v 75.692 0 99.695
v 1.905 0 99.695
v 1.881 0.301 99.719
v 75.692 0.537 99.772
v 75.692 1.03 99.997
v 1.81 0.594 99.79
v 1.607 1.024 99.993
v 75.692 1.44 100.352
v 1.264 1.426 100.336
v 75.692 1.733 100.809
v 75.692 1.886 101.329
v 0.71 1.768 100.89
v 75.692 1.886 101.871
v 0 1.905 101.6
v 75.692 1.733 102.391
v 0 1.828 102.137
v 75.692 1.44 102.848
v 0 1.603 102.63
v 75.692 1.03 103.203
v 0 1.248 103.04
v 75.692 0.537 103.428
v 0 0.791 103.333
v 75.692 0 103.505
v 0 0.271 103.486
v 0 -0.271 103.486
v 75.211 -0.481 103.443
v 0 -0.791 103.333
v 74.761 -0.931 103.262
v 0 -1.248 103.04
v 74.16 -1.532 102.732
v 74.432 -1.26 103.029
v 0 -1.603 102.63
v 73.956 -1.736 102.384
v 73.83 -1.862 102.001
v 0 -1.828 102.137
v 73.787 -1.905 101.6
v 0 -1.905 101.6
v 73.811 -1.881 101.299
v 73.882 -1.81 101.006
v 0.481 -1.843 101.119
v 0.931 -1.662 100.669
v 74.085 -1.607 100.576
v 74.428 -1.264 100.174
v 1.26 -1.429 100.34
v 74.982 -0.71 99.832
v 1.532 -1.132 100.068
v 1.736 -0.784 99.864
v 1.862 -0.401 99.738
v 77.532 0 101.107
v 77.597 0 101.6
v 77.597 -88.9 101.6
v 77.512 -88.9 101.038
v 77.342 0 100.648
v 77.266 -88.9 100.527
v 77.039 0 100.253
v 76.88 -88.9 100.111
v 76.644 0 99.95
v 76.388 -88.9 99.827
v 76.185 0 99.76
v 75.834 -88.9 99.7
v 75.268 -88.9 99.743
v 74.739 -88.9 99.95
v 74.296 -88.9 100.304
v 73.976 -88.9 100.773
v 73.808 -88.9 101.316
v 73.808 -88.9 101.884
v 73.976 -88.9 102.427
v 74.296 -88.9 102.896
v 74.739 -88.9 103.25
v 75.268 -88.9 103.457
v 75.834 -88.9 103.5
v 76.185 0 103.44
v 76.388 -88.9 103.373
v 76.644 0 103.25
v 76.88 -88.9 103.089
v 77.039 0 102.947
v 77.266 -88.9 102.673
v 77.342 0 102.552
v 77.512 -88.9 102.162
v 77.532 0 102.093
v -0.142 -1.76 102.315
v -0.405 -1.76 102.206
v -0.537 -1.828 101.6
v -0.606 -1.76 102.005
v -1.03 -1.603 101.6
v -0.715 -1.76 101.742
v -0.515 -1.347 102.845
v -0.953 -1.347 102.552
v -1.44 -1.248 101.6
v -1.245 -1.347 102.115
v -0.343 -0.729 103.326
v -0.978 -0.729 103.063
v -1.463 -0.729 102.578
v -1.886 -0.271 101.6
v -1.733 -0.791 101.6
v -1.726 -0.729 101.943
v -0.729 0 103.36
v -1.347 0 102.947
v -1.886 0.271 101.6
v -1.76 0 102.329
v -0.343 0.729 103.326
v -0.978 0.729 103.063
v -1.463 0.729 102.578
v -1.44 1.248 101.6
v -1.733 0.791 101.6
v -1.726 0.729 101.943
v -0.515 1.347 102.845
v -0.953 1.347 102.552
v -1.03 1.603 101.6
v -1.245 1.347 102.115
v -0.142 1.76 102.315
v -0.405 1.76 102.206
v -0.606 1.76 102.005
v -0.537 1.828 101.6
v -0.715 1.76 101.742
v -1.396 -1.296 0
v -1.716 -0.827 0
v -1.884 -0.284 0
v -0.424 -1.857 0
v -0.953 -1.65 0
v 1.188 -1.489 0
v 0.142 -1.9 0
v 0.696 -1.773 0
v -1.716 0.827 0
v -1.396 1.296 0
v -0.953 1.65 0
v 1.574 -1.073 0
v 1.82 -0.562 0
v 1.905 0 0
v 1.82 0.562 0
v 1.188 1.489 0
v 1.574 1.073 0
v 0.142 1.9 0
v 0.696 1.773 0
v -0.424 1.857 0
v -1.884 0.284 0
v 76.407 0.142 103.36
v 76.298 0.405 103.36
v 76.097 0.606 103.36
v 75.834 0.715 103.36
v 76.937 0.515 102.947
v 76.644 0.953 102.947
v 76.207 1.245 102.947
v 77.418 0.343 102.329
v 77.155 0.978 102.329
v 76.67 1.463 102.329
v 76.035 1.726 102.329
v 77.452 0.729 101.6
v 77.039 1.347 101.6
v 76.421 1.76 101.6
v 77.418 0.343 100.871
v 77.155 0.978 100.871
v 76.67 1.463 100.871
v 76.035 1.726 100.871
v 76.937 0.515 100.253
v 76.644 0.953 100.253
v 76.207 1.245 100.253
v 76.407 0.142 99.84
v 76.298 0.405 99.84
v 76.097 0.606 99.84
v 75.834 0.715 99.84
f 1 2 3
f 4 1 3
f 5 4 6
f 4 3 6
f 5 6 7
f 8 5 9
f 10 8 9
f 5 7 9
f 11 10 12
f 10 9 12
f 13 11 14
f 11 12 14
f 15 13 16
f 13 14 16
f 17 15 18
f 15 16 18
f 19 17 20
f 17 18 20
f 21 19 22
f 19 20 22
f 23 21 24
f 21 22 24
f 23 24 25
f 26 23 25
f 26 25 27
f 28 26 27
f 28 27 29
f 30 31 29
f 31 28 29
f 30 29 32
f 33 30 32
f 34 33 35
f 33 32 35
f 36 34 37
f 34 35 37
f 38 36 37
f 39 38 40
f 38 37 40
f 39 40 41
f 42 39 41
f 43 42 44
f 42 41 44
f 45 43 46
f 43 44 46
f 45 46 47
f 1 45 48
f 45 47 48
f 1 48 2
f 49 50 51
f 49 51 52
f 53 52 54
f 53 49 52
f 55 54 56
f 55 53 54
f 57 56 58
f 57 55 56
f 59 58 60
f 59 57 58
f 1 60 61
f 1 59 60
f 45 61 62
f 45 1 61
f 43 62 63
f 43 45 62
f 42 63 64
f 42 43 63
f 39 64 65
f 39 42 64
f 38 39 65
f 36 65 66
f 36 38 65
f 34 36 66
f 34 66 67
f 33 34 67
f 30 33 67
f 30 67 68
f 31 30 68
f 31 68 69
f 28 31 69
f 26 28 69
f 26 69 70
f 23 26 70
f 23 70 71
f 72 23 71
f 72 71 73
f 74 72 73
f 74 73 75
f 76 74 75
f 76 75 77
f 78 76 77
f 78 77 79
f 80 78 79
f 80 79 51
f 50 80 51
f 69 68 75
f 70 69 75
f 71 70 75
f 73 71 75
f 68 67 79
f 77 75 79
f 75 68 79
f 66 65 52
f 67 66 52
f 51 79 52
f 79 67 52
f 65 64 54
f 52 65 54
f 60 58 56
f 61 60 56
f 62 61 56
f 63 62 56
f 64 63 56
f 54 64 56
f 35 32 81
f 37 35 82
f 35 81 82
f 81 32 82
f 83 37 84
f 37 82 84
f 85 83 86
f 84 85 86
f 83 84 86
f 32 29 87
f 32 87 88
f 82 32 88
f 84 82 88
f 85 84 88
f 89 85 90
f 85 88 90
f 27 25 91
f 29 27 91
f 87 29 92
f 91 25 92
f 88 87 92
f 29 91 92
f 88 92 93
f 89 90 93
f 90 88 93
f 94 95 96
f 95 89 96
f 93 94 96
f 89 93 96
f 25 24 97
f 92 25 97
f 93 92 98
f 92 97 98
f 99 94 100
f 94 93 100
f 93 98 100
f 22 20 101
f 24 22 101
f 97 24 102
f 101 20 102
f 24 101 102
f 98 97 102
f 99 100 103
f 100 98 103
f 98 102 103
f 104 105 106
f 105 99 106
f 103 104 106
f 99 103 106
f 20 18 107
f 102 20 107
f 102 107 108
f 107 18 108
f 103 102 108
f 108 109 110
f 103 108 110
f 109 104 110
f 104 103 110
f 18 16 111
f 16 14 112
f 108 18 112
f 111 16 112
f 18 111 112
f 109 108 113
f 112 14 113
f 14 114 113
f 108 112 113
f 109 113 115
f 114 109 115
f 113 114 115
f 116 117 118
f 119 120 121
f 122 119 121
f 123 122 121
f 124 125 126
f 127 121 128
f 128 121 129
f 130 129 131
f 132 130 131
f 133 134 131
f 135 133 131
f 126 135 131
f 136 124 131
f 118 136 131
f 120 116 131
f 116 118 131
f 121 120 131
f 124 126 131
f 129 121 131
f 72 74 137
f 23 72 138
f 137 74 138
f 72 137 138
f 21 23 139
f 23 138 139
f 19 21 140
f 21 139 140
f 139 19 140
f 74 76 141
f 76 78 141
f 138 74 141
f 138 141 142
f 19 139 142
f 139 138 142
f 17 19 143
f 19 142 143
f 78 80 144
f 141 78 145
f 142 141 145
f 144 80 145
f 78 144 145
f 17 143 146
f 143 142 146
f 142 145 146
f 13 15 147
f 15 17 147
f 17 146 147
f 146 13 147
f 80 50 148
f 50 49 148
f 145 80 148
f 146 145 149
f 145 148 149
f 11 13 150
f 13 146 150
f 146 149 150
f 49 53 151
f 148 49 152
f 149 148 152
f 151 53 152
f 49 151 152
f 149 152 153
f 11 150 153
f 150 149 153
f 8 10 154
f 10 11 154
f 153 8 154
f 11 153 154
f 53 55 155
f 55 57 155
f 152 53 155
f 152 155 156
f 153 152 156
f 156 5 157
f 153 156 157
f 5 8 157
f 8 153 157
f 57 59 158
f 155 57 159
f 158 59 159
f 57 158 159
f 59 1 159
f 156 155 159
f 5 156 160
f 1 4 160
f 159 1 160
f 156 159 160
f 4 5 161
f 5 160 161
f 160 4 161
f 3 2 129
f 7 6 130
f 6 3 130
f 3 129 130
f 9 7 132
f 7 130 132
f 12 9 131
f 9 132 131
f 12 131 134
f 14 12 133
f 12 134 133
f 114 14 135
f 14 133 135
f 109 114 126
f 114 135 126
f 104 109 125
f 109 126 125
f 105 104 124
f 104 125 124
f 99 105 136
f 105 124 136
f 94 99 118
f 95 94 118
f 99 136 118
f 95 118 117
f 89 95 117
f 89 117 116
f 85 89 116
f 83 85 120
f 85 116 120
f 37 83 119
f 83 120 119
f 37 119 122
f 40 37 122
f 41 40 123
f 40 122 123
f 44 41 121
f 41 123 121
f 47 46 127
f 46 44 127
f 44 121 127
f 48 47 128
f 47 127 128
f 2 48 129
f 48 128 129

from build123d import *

# Parameters (mm, degrees)
SKETCH4_R           = 1.905
BOSS_EXTRUDE1_DEPTH = 101.6
SKETCH5_R           = 1.905
BOSS_EXTRUDE2_DEPTH = 75.692
SKETCH7_R           = 1.905
BOSS_EXTRUDE3_DEPTH = 88.9


with BuildPart() as part:
    # Sketch4 → Boss-Extrude1 (new body)
    with BuildSketch(Plane.XY):
        Circle(SKETCH4_R)
    extrude(amount=BOSS_EXTRUDE1_DEPTH)

    # Sketch5 → Boss-Extrude2 (add)
    with BuildSketch(Plane(origin=(0, 0, 0), x_dir=(0, 0, -1), z_dir=(1, 0, 0))):
        with Locations((-101.6, 0)):
            Circle(SKETCH5_R)
    extrude(amount=BOSS_EXTRUDE2_DEPTH)

    # Sketch6 → Revolve1 (revolve)
    with BuildSketch(Plane.ZY):
        with BuildLine():
            Line((101.6, 1.905), (101.6, -1.905))
            ThreePointArc((101.6, -1.905), (103.505, 0), (101.6, 1.905))
        make_face()
    revolve(axis=Axis((0, 1.905, 101.6), (0, -1, 0)))

    # Sketch7 → Boss-Extrude3 (add)
    with BuildSketch(Plane(origin=(0, 0, 0), x_dir=(1, 0, 0), z_dir=(0, 1, 0))):
        with Locations((75.692, -101.6)):
            Circle(SKETCH7_R)
    extrude(amount=-BOSS_EXTRUDE3_DEPTH)

    # Sketch8 → Revolve2 (revolve)
    with BuildSketch(Plane(origin=(0, 0, 0), x_dir=(1, 0, 0), z_dir=(0, 1, 0))):
        with BuildLine():
            Line((75.692, -99.695), (75.692, -103.505))
            ThreePointArc((75.692, -103.505), (77.597, -101.6), (75.692, -99.695))
        make_face()
    revolve(axis=Axis((75.692, 0, 99.695), (0, 0, 1)))


solid = part.part
